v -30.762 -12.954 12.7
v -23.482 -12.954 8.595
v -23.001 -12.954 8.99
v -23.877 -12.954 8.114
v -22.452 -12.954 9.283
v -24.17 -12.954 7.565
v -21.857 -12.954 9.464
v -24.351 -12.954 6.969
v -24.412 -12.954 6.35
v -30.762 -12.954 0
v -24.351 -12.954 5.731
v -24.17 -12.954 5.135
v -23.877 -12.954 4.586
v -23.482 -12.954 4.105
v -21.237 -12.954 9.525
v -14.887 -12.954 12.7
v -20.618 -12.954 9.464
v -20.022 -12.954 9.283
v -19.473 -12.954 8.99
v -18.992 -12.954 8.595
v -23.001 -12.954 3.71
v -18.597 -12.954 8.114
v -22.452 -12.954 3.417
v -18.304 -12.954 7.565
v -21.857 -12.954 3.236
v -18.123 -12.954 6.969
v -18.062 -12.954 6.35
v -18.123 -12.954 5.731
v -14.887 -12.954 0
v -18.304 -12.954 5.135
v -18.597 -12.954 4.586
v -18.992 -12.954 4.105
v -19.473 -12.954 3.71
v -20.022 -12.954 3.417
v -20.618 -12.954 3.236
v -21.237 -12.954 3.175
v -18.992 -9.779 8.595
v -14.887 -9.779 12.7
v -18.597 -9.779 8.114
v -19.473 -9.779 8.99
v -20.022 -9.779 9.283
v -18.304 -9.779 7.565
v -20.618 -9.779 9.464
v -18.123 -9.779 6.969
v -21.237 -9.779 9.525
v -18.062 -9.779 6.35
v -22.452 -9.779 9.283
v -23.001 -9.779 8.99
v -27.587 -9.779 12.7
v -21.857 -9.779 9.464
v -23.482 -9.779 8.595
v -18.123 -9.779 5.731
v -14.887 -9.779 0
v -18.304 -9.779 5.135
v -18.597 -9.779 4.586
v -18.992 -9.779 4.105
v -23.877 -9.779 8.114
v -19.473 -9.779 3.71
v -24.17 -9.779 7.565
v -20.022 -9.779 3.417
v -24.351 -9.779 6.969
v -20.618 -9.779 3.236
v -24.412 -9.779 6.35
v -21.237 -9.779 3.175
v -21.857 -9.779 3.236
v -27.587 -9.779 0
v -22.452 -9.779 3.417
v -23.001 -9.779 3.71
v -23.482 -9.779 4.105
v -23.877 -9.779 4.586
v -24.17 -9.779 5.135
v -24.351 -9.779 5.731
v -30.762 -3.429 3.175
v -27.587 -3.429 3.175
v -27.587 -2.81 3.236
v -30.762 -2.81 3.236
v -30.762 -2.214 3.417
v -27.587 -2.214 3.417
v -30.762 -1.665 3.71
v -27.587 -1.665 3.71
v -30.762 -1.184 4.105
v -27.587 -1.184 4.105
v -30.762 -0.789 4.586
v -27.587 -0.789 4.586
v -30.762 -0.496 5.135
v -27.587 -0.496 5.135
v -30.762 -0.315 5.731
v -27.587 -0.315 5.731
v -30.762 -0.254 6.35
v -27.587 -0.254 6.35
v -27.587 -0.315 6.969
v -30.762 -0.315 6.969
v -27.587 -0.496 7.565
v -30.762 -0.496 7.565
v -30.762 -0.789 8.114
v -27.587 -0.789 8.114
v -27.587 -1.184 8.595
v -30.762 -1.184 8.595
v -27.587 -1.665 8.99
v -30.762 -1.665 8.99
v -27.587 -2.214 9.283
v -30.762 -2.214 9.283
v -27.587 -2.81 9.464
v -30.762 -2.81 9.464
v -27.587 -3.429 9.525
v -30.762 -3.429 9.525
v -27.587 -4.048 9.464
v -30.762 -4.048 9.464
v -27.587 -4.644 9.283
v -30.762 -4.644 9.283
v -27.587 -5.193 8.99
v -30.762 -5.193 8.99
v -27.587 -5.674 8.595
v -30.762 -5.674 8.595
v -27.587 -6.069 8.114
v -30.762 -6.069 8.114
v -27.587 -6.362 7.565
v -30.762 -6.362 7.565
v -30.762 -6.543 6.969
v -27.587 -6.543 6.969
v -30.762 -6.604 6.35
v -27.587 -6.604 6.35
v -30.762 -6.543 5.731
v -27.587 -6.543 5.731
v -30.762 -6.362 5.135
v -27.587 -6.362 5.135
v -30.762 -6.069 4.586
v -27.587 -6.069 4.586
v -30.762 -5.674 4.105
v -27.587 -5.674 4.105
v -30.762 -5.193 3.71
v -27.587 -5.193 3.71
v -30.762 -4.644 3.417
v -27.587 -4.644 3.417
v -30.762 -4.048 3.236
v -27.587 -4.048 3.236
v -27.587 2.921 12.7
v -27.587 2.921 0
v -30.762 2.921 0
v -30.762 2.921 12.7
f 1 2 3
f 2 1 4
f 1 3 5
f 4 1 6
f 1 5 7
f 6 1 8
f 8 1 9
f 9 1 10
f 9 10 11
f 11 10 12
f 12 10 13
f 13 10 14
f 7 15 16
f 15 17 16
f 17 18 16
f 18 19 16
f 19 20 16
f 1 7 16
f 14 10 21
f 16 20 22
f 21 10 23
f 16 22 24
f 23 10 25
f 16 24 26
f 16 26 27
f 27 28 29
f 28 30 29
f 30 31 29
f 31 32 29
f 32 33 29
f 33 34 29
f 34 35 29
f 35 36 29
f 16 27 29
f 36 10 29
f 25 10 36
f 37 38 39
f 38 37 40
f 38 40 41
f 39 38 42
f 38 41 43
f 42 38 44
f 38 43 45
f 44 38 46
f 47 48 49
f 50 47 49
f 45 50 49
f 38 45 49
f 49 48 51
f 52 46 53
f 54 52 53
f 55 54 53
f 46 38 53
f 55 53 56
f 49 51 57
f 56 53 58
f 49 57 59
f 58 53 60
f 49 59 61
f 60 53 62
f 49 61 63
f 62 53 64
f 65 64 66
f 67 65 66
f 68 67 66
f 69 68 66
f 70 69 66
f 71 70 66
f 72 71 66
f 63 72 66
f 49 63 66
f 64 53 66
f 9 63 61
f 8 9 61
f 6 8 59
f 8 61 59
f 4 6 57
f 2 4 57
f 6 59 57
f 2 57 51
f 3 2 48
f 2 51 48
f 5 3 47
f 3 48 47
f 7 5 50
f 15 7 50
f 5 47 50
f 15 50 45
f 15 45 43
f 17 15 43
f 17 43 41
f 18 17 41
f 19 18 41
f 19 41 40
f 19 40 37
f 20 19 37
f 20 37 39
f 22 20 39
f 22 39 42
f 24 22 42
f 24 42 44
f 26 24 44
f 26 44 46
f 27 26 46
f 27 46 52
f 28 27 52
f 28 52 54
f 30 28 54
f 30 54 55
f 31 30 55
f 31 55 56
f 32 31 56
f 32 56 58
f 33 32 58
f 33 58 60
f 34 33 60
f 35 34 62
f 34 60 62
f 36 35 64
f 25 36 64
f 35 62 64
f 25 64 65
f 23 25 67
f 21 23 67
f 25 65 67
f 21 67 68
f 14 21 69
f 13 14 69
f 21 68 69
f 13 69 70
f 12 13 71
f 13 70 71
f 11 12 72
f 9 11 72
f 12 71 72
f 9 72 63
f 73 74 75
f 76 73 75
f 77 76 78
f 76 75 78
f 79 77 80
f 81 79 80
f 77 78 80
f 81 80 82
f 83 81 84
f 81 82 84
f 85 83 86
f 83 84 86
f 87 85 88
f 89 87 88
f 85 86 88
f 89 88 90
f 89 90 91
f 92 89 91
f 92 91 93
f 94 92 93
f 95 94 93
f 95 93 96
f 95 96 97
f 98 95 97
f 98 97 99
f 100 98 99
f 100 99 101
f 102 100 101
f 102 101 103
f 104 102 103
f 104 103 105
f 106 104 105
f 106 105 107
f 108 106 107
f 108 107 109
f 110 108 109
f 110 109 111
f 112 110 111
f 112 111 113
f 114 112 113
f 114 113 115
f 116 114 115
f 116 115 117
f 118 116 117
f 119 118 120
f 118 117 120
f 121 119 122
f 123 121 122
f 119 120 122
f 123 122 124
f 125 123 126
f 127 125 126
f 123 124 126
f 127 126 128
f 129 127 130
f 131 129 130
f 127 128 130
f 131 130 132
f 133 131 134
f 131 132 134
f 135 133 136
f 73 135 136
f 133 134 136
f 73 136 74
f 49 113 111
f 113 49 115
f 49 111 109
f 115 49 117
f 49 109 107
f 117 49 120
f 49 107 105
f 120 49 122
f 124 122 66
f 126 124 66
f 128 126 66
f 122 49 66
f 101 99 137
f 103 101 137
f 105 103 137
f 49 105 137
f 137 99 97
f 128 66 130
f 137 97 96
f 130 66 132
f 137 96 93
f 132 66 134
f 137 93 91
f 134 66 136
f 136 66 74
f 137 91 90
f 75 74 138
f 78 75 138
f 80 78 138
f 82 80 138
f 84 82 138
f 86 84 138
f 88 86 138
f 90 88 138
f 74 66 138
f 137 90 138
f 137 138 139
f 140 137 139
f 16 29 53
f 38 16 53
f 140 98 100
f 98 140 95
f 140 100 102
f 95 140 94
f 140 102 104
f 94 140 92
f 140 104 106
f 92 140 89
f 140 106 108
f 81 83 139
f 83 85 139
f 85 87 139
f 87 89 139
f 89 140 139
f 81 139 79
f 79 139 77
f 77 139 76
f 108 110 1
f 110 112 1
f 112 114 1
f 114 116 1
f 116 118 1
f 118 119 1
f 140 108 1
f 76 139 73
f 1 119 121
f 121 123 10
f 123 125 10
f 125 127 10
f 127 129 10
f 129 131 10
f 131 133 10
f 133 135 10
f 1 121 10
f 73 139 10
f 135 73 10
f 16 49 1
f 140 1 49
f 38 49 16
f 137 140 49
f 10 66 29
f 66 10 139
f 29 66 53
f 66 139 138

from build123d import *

# Parameters (mm, degrees)
BOSS_EXTRUDE1_DEPTH = 12.7
SKETCH2_R           = 3.175
CUT_EXTRUDE1_DEPTH  = 12.7
SKETCH3_R           = 3.175
CUT_EXTRUDE2_DEPTH  = 12.7


with BuildPart() as part:
    # Sketch1 → Boss-Extrude1 (new body)
    with BuildSketch(Plane.XY):
        Polygon((-30.762128425, 2.921), (-30.762128425, -12.954), (-14.887128425, -12.954), (-14.887128425, -9.779), (-27.587128425, -9.779), (-27.587128425, 2.921), align=None)
    extrude(amount=BOSS_EXTRUDE1_DEPTH)

    # Sketch2 → Cut-Extrude1 (cut)
    with BuildSketch(Plane(origin=(-27.587128425, 0, 0), x_dir=(0, 0, -1), z_dir=(1, 0, 0))):
        with Locations((-6.35, -3.429)):
            Circle(SKETCH2_R)
    extrude(amount=-CUT_EXTRUDE1_DEPTH, mode=Mode.SUBTRACT)

    # Sketch3 → Cut-Extrude2 (cut)
    with BuildSketch(Plane(origin=(0, -9.779, 0), x_dir=(1, 0, 0), z_dir=(0, 1, 0))):
        with Locations(Location((-21.237128425, -6.35, 0), (0, 0, 180))):
            Circle(SKETCH3_R)
    extrude(amount=-CUT_EXTRUDE2_DEPTH, mode=Mode.SUBTRACT)


solid = part.part
